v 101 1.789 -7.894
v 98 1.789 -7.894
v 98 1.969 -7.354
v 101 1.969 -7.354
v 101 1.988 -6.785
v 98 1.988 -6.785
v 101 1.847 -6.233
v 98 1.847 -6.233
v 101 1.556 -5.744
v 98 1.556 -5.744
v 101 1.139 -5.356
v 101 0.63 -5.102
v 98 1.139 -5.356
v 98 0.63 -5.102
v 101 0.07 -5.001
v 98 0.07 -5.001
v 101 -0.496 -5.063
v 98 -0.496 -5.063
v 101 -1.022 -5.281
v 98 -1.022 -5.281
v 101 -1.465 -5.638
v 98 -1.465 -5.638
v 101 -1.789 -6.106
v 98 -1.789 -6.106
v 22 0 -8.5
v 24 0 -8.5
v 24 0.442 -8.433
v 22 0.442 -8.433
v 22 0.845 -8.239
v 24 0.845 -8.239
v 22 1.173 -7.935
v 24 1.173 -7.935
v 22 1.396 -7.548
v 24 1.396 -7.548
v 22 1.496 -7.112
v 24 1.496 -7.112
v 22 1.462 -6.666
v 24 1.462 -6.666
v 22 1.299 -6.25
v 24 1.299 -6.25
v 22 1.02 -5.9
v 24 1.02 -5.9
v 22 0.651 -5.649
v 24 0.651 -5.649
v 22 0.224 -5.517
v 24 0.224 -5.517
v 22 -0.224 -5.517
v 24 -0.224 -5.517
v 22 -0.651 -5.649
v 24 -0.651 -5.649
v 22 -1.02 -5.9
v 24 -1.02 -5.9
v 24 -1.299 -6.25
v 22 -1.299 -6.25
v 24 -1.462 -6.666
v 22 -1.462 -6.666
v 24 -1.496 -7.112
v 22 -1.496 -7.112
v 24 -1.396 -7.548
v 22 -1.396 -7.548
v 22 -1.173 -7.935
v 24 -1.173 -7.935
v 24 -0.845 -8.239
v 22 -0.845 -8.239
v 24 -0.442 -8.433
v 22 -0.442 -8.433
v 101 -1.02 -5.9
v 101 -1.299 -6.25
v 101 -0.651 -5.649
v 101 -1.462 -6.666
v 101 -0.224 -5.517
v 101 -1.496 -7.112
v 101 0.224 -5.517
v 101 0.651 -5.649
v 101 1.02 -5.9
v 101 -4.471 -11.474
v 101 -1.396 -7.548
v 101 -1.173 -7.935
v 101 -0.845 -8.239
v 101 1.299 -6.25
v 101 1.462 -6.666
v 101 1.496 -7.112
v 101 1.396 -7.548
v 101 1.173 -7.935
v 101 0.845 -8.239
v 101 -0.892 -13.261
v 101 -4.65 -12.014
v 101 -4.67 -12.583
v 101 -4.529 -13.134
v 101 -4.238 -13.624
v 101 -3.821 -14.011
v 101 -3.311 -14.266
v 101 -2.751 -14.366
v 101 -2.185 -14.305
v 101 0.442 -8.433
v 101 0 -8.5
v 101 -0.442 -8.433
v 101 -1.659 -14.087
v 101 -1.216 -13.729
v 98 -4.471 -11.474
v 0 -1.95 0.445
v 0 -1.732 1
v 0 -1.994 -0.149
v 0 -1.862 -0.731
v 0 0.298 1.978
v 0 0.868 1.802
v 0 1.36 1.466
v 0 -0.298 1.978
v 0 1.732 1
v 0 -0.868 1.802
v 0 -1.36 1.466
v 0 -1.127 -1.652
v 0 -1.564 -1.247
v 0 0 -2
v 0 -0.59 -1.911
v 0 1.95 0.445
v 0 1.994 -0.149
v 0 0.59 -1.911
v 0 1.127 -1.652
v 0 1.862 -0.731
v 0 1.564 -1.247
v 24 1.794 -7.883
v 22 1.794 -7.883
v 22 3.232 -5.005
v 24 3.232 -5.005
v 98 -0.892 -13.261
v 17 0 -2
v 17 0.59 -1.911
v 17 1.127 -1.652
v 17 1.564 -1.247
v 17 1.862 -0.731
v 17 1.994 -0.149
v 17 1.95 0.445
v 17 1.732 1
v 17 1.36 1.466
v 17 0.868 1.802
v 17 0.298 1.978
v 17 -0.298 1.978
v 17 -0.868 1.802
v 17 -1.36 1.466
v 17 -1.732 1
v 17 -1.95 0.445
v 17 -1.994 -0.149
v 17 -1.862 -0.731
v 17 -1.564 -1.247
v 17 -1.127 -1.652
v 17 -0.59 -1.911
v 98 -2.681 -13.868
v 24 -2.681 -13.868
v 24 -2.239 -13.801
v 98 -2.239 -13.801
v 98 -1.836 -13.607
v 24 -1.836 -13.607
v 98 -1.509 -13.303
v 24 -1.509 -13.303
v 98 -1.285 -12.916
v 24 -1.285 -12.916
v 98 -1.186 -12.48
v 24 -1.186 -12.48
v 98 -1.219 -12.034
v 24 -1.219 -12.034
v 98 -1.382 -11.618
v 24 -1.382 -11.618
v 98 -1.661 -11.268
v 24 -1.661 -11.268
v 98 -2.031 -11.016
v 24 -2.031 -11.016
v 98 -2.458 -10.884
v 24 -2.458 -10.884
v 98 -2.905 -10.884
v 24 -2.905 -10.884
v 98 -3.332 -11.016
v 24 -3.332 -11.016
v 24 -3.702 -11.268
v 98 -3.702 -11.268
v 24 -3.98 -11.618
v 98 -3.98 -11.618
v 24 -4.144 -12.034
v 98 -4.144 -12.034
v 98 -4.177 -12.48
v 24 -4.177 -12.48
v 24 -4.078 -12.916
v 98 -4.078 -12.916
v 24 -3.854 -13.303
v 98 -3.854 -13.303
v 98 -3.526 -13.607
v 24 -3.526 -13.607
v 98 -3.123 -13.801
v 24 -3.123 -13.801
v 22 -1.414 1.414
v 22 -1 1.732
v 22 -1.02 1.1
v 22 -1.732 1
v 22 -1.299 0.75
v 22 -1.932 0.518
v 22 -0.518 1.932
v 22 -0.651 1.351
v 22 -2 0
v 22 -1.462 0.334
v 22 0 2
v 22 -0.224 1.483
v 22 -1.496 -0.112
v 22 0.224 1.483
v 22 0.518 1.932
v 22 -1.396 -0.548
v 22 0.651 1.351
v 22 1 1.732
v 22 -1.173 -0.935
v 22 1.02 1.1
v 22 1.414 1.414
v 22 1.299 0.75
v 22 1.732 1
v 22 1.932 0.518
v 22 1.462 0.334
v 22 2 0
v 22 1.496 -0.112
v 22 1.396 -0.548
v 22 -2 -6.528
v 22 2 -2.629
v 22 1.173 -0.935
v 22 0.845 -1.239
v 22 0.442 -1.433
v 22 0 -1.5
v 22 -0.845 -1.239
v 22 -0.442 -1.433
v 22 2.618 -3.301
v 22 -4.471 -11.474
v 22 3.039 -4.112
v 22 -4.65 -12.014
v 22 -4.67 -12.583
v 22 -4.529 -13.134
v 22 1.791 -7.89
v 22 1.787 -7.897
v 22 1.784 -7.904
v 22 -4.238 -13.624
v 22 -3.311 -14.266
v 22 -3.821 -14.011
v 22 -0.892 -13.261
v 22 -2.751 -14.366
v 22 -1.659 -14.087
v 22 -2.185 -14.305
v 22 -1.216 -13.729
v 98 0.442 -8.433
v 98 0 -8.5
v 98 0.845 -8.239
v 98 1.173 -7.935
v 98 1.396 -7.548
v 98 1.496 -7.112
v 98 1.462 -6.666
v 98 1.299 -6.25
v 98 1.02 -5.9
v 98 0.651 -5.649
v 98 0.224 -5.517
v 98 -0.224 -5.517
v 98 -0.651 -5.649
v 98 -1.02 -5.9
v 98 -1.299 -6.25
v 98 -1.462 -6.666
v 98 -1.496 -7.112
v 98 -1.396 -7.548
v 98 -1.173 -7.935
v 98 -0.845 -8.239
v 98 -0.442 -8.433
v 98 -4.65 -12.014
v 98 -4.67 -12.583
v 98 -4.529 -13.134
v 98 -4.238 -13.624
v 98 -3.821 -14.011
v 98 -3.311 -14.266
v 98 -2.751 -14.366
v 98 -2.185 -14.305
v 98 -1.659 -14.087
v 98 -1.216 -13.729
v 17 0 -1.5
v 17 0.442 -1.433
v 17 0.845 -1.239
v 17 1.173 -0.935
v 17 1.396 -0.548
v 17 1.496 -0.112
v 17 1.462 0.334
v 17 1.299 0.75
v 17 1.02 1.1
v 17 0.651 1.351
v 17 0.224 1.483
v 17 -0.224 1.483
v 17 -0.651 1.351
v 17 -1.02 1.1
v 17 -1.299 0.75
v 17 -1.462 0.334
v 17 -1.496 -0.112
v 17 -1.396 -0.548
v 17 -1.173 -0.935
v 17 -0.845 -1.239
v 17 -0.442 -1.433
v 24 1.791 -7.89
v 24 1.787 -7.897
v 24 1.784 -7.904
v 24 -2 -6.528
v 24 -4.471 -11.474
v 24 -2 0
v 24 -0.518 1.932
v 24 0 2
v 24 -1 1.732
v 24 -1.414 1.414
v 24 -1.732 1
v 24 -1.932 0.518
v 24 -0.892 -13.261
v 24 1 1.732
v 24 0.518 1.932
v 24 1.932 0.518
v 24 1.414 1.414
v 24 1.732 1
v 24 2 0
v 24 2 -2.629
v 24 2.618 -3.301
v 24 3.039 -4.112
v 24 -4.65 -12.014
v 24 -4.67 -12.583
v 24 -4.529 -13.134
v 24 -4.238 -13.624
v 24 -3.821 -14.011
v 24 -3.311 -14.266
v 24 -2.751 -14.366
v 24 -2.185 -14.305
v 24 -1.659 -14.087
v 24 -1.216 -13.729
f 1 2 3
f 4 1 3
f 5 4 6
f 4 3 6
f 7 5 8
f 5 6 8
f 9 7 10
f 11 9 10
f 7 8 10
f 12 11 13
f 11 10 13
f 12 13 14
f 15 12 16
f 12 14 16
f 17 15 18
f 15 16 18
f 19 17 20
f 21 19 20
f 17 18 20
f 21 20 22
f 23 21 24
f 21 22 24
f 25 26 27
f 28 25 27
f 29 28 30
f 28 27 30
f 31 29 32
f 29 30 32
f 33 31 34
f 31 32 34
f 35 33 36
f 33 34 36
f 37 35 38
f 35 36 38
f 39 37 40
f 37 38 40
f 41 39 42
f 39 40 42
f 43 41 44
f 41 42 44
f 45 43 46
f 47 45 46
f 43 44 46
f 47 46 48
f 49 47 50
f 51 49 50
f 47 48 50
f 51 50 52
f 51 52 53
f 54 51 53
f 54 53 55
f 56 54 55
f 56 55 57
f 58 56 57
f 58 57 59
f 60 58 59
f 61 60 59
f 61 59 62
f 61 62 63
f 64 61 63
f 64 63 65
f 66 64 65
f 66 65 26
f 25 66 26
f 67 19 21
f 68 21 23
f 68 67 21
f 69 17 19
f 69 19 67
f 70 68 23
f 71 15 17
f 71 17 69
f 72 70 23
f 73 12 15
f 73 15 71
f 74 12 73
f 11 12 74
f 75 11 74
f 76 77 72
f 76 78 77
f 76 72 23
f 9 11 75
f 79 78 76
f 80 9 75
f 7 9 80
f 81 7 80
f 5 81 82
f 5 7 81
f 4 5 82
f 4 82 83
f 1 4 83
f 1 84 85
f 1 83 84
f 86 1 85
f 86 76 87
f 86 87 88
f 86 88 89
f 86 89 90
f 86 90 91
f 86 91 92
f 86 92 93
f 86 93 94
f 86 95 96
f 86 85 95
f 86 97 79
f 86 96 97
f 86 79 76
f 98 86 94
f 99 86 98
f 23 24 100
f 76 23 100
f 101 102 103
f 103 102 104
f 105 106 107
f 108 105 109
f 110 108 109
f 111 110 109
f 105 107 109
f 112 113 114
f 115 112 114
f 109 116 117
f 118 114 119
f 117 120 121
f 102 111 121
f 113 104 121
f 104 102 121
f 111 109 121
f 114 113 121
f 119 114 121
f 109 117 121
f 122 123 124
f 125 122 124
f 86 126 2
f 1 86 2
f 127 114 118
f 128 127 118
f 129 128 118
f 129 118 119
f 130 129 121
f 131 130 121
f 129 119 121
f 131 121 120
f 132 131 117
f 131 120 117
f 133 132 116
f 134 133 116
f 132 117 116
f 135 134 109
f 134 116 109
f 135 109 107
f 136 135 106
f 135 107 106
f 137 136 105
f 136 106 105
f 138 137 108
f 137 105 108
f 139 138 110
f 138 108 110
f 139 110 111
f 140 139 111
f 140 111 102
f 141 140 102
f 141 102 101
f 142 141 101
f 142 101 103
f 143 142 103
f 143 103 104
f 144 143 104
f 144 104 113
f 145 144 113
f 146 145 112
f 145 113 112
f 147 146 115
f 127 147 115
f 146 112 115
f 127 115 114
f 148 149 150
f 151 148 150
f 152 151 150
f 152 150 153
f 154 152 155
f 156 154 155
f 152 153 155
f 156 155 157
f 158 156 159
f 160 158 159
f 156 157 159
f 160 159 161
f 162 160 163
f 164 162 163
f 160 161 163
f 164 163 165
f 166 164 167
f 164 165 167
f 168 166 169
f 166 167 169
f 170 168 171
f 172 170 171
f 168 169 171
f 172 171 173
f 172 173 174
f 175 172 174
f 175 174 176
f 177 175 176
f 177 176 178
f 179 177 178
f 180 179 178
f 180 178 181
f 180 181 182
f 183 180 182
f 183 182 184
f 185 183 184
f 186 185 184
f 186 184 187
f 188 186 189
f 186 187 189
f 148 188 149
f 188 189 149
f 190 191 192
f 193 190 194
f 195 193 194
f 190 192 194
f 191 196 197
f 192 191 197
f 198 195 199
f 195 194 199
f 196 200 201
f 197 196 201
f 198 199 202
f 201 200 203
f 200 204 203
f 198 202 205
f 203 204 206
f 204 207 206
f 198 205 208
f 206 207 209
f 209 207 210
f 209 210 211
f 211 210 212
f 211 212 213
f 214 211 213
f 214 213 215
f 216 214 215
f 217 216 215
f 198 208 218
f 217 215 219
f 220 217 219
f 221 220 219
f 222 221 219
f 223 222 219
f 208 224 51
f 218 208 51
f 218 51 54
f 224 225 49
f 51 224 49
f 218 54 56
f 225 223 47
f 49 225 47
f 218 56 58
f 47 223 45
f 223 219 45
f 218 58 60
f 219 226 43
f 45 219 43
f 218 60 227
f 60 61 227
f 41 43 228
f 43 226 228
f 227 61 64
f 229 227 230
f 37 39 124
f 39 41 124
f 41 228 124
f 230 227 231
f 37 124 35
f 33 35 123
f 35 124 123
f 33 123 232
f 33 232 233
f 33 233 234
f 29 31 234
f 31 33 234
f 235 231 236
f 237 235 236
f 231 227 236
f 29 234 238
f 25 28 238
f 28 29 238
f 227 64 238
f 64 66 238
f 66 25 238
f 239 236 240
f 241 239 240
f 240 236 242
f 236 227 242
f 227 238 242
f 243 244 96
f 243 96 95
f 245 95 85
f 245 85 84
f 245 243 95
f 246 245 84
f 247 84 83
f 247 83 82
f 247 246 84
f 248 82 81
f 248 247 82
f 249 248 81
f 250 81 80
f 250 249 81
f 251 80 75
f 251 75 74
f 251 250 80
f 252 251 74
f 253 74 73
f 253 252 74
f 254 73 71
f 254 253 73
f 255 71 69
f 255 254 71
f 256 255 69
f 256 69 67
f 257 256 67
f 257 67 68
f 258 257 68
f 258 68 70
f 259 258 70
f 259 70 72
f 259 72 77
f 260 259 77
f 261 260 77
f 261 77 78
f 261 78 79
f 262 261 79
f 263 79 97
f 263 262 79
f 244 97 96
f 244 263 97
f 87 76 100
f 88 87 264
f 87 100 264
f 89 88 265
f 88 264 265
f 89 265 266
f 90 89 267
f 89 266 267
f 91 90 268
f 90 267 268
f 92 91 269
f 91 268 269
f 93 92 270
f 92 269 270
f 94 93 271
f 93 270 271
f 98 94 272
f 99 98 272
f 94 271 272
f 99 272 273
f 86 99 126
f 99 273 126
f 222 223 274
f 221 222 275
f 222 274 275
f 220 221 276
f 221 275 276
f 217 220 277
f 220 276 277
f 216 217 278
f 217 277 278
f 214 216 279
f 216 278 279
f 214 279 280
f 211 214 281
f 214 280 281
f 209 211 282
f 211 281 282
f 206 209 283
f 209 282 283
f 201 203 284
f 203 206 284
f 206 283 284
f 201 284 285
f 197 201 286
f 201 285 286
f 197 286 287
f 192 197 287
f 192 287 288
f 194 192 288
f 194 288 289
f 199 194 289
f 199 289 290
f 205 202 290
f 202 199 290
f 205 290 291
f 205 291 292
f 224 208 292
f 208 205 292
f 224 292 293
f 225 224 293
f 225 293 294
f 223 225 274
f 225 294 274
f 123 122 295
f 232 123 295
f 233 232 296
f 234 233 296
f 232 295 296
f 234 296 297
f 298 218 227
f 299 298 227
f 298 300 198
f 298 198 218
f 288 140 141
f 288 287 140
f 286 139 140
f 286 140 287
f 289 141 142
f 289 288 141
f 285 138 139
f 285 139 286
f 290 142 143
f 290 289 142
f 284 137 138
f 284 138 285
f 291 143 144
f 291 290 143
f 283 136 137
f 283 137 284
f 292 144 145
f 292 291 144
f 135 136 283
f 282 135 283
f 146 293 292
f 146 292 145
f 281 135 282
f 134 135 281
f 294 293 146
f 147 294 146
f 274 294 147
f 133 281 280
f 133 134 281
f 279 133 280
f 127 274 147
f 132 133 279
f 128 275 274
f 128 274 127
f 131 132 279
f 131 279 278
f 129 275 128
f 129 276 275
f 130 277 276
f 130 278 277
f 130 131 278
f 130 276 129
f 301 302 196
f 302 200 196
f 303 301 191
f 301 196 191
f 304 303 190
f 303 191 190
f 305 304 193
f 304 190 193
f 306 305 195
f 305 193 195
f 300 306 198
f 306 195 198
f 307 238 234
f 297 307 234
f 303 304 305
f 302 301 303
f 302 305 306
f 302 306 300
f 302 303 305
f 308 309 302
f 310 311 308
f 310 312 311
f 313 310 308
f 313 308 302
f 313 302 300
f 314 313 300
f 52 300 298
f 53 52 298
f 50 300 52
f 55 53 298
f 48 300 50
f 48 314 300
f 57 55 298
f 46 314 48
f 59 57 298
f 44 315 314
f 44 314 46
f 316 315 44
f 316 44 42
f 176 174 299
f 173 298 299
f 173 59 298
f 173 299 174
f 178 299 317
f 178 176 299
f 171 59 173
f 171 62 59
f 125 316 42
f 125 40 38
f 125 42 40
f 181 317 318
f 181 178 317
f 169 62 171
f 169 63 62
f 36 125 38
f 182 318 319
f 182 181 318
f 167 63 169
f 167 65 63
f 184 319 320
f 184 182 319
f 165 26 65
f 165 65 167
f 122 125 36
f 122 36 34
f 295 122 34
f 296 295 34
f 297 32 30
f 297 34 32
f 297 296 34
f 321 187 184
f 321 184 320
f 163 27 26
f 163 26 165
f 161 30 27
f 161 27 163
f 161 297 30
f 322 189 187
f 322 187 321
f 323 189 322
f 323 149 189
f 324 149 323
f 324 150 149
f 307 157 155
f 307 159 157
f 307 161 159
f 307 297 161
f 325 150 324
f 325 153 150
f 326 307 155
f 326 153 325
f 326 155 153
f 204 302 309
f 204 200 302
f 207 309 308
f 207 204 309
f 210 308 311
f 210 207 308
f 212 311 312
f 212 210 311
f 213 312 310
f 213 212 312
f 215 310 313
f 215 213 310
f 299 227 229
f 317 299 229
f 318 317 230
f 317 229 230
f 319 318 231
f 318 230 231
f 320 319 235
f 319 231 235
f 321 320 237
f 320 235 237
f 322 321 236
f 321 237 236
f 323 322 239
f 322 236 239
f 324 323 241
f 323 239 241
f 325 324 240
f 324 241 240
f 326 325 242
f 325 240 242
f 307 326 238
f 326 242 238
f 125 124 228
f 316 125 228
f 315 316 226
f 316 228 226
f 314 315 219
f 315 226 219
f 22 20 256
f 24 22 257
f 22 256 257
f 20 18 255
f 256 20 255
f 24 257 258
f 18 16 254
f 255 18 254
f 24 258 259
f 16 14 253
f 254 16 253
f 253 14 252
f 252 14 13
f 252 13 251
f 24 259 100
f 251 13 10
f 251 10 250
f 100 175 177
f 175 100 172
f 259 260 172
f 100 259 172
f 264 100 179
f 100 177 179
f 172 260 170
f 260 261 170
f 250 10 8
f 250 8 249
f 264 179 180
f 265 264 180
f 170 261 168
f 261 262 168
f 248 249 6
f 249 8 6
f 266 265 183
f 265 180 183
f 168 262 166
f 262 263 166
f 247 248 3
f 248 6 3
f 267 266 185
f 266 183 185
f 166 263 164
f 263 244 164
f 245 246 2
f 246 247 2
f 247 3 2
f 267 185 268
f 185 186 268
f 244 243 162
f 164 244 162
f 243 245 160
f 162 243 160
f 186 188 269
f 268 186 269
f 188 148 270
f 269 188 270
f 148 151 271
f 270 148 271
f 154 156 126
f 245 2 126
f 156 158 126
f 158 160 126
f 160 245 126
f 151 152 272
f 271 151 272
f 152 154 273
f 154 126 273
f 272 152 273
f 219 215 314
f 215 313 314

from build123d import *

# Parameters (mm, degrees)
SKETCH2_R            = 2
BOSS_EXTRUDE1_DEPTH  = 17
SKETCH3_R            = 1.5
BOSS_EXTRUDE2_DEPTH  = 7
SKETCH4_W            = 3.988125856
SKETCH4_H            = 4
BOSS_EXTRUDE3_DEPTH  = 2
SKETCH5_W            = 2
SKETCH5_H            = 4
BOSS_EXTRUDE4_DEPTH  = 11
FILLET1_R            = 2
FILLET2_R            = 2
FILLET3_R            = 2
SKETCH6_R            = 1.5
CUT_EXTRUDE1_DEPTH   = 26.709920264
BOSS_EXTRUDE8_START  = -2
BOSS_EXTRUDE8_DEPTH  = 2
SKETCH11_R           = 1.5
BOSS_EXTRUDE9_DEPTH  = 74
SKETCH13_R           = 2
SKETCH13_R_2         = 1.5
BOSS_EXTRUDE10_DEPTH = 3


# Read off the part's stored shape, not the designer's step: Boss-Extrude8
with BuildPart() as part:
    # Sketch2 → Boss-Extrude1 (new body)
    with BuildSketch(Plane(origin=(0, 0, 0), x_dir=(0, 0, -1), z_dir=(1, 0, 0))):
        Circle(SKETCH2_R)
    extrude(amount=BOSS_EXTRUDE1_DEPTH)

    # Sketch3 → Boss-Extrude2 (add)
    with BuildSketch(Plane(origin=(17, 0, 0), x_dir=(0, 0, -1), z_dir=(1, 0, 0))):
        Circle(SKETCH3_R)
    extrude(amount=BOSS_EXTRUDE2_DEPTH)

    # Sketch4 → Boss-Extrude3 (add)
    with BuildSketch(Plane(origin=(24, 0, 0), x_dir=(0, 0, -1), z_dir=(1, 0, 0))):
        with Locations((-0.005937072, 0)):
            Rectangle(SKETCH4_W, SKETCH4_H)
    extrude(amount=-BOSS_EXTRUDE3_DEPTH)

    # Sketch5 → Boss-Extrude4 (add)
    with BuildSketch(Plane.XY.offset(2)):
        with Locations((23, 0)):
            Rectangle(SKETCH5_W, SKETCH5_H)
    extrude(amount=-BOSS_EXTRUDE4_DEPTH)

    # Fillet1
    fillet1_edges = [part.edges().sort_by_distance(p)[0] for p in [
        (23, 2, 2),
    ]]
    fillet(fillet1_edges, radius=FILLET1_R)

    # Fillet2
    fillet2_edges = [part.edges().sort_by_distance(p)[0] for p in [
        (23, -2, 2),
    ]]
    fillet(fillet2_edges, radius=FILLET2_R - 0.0001)  # a hair under: the kernel refuses the full size

    # Fillet3
    fillet3_edges = [part.edges().sort_by_distance(p)[0] for p in [
        (23, -2, -9),
        (23, 2, -9),
    ]]
    fillet(fillet3_edges, radius=FILLET3_R - 0.0001)  # a hair under: the kernel refuses the full size

    # Sketch6 → Cut-Extrude1 (cut, through all)
    with BuildSketch(Plane(origin=(24, 0, 0), x_dir=(0, 0, -1), z_dir=(1, 0, 0))):
        with Locations((7, 0)):
            Circle(SKETCH6_R)
    extrude(amount=-CUT_EXTRUDE1_DEPTH, mode=Mode.SUBTRACT)

    # Boss-Extrude8 outline → Boss-Extrude8 (add)
    with BuildSketch(Plane(origin=(24, 0, 0), x_dir=(0, 0, -1), z_dir=(1, 0, 0)).offset(BOSS_EXTRUDE8_START)):
        with BuildLine():
            Line((7.893788641, 1.789173514), (5.005331724, 3.232113464))
            ThreePointArc((5.005331724, 3.232113464), (3.692949686, 2.855553556), (2.628913929, 2))
            Line((2.628913929, 2), (7, 2))
            ThreePointArc((7, 2), (7.459158453, 1.946579953), (7.893788641, 1.789173514))
        make_face()
        with BuildLine():
            Line((13.26130919, -0.892192368), (7.893788641, 1.789173514))
            ThreePointArc((7.893788641, 1.789173514), (8.701113941, 1.051765829), (9, 0))
            ThreePointArc((9, 0), (8.414213562, -1.414213562), (7, -2))
            Line((7, -2), (6.528240855, -2))
            Line((6.528240855, -2), (11.473731932, -4.470539409))
            ThreePointArc((11.473731932, -4.470539409), (14.156694081, -3.575154517), (13.26130919, -0.892192368))
        make_face()
    extrude(amount=BOSS_EXTRUDE8_DEPTH)

    # Sketch11 → Boss-Extrude9 (add)
    with BuildSketch(Plane(origin=(24, 0, 0), x_dir=(0, 0, -1), z_dir=(1, 0, 0))):
        with Locations((12.367520561, -2.681365888)):
            Circle(SKETCH11_R)
    extrude(amount=BOSS_EXTRUDE9_DEPTH)

    # Sketch13 → Boss-Extrude10 (add)
    # profile 1 of 4: a face of its own
    with BuildSketch(Plane(origin=(98, 0, 0), x_dir=(0, 0, -1), z_dir=(1, 0, 0))):
        with Locations((7, 0)):
            Circle(SKETCH13_R)
        with Locations((7, 0)):
            Circle(SKETCH13_R_2, mode=Mode.SUBTRACT)
    # profile 2 of 4: a face of its own
    with BuildSketch(Plane(origin=(98, 0, 0), x_dir=(0, 0, -1), z_dir=(1, 0, 0))):
        with Locations((12.367520561, -2.681365888)):
            Circle(SKETCH13_R)
        with Locations((12.367520561, -2.681365888)):
            Circle(SKETCH13_R_2, mode=Mode.SUBTRACT)
    # profile 3 of 4: a face of its own
    with BuildSketch(Plane(origin=(98, 0, 0), x_dir=(0, 0, -1), z_dir=(1, 0, 0))):
        with BuildLine():
            ThreePointArc((9, 0), (8.051765834, -1.701113938), (6.106211371, -1.78917352))
            Line((6.106211371, -1.78917352), (11.473731932, -4.470539409))
            ThreePointArc((11.473731932, -4.470539409), (10.578347041, -1.787577259), (13.26130919, -0.892192368))
            Line((13.26130919, -0.892192368), (7.893788629, 1.78917352))
            ThreePointArc((7.893788629, 1.78917352), (8.701113938, 1.051765834), (9, 0))
        make_face()
    # profile 4 of 4: a face of its own
    with BuildSketch(Plane(origin=(98, 0, 0), x_dir=(0, 0, -1), z_dir=(1, 0, 0))):
        with Locations((12.367520561, -2.681365888)):
            Circle(SKETCH13_R_2)
    extrude(amount=BOSS_EXTRUDE10_DEPTH)


solid = part.part
